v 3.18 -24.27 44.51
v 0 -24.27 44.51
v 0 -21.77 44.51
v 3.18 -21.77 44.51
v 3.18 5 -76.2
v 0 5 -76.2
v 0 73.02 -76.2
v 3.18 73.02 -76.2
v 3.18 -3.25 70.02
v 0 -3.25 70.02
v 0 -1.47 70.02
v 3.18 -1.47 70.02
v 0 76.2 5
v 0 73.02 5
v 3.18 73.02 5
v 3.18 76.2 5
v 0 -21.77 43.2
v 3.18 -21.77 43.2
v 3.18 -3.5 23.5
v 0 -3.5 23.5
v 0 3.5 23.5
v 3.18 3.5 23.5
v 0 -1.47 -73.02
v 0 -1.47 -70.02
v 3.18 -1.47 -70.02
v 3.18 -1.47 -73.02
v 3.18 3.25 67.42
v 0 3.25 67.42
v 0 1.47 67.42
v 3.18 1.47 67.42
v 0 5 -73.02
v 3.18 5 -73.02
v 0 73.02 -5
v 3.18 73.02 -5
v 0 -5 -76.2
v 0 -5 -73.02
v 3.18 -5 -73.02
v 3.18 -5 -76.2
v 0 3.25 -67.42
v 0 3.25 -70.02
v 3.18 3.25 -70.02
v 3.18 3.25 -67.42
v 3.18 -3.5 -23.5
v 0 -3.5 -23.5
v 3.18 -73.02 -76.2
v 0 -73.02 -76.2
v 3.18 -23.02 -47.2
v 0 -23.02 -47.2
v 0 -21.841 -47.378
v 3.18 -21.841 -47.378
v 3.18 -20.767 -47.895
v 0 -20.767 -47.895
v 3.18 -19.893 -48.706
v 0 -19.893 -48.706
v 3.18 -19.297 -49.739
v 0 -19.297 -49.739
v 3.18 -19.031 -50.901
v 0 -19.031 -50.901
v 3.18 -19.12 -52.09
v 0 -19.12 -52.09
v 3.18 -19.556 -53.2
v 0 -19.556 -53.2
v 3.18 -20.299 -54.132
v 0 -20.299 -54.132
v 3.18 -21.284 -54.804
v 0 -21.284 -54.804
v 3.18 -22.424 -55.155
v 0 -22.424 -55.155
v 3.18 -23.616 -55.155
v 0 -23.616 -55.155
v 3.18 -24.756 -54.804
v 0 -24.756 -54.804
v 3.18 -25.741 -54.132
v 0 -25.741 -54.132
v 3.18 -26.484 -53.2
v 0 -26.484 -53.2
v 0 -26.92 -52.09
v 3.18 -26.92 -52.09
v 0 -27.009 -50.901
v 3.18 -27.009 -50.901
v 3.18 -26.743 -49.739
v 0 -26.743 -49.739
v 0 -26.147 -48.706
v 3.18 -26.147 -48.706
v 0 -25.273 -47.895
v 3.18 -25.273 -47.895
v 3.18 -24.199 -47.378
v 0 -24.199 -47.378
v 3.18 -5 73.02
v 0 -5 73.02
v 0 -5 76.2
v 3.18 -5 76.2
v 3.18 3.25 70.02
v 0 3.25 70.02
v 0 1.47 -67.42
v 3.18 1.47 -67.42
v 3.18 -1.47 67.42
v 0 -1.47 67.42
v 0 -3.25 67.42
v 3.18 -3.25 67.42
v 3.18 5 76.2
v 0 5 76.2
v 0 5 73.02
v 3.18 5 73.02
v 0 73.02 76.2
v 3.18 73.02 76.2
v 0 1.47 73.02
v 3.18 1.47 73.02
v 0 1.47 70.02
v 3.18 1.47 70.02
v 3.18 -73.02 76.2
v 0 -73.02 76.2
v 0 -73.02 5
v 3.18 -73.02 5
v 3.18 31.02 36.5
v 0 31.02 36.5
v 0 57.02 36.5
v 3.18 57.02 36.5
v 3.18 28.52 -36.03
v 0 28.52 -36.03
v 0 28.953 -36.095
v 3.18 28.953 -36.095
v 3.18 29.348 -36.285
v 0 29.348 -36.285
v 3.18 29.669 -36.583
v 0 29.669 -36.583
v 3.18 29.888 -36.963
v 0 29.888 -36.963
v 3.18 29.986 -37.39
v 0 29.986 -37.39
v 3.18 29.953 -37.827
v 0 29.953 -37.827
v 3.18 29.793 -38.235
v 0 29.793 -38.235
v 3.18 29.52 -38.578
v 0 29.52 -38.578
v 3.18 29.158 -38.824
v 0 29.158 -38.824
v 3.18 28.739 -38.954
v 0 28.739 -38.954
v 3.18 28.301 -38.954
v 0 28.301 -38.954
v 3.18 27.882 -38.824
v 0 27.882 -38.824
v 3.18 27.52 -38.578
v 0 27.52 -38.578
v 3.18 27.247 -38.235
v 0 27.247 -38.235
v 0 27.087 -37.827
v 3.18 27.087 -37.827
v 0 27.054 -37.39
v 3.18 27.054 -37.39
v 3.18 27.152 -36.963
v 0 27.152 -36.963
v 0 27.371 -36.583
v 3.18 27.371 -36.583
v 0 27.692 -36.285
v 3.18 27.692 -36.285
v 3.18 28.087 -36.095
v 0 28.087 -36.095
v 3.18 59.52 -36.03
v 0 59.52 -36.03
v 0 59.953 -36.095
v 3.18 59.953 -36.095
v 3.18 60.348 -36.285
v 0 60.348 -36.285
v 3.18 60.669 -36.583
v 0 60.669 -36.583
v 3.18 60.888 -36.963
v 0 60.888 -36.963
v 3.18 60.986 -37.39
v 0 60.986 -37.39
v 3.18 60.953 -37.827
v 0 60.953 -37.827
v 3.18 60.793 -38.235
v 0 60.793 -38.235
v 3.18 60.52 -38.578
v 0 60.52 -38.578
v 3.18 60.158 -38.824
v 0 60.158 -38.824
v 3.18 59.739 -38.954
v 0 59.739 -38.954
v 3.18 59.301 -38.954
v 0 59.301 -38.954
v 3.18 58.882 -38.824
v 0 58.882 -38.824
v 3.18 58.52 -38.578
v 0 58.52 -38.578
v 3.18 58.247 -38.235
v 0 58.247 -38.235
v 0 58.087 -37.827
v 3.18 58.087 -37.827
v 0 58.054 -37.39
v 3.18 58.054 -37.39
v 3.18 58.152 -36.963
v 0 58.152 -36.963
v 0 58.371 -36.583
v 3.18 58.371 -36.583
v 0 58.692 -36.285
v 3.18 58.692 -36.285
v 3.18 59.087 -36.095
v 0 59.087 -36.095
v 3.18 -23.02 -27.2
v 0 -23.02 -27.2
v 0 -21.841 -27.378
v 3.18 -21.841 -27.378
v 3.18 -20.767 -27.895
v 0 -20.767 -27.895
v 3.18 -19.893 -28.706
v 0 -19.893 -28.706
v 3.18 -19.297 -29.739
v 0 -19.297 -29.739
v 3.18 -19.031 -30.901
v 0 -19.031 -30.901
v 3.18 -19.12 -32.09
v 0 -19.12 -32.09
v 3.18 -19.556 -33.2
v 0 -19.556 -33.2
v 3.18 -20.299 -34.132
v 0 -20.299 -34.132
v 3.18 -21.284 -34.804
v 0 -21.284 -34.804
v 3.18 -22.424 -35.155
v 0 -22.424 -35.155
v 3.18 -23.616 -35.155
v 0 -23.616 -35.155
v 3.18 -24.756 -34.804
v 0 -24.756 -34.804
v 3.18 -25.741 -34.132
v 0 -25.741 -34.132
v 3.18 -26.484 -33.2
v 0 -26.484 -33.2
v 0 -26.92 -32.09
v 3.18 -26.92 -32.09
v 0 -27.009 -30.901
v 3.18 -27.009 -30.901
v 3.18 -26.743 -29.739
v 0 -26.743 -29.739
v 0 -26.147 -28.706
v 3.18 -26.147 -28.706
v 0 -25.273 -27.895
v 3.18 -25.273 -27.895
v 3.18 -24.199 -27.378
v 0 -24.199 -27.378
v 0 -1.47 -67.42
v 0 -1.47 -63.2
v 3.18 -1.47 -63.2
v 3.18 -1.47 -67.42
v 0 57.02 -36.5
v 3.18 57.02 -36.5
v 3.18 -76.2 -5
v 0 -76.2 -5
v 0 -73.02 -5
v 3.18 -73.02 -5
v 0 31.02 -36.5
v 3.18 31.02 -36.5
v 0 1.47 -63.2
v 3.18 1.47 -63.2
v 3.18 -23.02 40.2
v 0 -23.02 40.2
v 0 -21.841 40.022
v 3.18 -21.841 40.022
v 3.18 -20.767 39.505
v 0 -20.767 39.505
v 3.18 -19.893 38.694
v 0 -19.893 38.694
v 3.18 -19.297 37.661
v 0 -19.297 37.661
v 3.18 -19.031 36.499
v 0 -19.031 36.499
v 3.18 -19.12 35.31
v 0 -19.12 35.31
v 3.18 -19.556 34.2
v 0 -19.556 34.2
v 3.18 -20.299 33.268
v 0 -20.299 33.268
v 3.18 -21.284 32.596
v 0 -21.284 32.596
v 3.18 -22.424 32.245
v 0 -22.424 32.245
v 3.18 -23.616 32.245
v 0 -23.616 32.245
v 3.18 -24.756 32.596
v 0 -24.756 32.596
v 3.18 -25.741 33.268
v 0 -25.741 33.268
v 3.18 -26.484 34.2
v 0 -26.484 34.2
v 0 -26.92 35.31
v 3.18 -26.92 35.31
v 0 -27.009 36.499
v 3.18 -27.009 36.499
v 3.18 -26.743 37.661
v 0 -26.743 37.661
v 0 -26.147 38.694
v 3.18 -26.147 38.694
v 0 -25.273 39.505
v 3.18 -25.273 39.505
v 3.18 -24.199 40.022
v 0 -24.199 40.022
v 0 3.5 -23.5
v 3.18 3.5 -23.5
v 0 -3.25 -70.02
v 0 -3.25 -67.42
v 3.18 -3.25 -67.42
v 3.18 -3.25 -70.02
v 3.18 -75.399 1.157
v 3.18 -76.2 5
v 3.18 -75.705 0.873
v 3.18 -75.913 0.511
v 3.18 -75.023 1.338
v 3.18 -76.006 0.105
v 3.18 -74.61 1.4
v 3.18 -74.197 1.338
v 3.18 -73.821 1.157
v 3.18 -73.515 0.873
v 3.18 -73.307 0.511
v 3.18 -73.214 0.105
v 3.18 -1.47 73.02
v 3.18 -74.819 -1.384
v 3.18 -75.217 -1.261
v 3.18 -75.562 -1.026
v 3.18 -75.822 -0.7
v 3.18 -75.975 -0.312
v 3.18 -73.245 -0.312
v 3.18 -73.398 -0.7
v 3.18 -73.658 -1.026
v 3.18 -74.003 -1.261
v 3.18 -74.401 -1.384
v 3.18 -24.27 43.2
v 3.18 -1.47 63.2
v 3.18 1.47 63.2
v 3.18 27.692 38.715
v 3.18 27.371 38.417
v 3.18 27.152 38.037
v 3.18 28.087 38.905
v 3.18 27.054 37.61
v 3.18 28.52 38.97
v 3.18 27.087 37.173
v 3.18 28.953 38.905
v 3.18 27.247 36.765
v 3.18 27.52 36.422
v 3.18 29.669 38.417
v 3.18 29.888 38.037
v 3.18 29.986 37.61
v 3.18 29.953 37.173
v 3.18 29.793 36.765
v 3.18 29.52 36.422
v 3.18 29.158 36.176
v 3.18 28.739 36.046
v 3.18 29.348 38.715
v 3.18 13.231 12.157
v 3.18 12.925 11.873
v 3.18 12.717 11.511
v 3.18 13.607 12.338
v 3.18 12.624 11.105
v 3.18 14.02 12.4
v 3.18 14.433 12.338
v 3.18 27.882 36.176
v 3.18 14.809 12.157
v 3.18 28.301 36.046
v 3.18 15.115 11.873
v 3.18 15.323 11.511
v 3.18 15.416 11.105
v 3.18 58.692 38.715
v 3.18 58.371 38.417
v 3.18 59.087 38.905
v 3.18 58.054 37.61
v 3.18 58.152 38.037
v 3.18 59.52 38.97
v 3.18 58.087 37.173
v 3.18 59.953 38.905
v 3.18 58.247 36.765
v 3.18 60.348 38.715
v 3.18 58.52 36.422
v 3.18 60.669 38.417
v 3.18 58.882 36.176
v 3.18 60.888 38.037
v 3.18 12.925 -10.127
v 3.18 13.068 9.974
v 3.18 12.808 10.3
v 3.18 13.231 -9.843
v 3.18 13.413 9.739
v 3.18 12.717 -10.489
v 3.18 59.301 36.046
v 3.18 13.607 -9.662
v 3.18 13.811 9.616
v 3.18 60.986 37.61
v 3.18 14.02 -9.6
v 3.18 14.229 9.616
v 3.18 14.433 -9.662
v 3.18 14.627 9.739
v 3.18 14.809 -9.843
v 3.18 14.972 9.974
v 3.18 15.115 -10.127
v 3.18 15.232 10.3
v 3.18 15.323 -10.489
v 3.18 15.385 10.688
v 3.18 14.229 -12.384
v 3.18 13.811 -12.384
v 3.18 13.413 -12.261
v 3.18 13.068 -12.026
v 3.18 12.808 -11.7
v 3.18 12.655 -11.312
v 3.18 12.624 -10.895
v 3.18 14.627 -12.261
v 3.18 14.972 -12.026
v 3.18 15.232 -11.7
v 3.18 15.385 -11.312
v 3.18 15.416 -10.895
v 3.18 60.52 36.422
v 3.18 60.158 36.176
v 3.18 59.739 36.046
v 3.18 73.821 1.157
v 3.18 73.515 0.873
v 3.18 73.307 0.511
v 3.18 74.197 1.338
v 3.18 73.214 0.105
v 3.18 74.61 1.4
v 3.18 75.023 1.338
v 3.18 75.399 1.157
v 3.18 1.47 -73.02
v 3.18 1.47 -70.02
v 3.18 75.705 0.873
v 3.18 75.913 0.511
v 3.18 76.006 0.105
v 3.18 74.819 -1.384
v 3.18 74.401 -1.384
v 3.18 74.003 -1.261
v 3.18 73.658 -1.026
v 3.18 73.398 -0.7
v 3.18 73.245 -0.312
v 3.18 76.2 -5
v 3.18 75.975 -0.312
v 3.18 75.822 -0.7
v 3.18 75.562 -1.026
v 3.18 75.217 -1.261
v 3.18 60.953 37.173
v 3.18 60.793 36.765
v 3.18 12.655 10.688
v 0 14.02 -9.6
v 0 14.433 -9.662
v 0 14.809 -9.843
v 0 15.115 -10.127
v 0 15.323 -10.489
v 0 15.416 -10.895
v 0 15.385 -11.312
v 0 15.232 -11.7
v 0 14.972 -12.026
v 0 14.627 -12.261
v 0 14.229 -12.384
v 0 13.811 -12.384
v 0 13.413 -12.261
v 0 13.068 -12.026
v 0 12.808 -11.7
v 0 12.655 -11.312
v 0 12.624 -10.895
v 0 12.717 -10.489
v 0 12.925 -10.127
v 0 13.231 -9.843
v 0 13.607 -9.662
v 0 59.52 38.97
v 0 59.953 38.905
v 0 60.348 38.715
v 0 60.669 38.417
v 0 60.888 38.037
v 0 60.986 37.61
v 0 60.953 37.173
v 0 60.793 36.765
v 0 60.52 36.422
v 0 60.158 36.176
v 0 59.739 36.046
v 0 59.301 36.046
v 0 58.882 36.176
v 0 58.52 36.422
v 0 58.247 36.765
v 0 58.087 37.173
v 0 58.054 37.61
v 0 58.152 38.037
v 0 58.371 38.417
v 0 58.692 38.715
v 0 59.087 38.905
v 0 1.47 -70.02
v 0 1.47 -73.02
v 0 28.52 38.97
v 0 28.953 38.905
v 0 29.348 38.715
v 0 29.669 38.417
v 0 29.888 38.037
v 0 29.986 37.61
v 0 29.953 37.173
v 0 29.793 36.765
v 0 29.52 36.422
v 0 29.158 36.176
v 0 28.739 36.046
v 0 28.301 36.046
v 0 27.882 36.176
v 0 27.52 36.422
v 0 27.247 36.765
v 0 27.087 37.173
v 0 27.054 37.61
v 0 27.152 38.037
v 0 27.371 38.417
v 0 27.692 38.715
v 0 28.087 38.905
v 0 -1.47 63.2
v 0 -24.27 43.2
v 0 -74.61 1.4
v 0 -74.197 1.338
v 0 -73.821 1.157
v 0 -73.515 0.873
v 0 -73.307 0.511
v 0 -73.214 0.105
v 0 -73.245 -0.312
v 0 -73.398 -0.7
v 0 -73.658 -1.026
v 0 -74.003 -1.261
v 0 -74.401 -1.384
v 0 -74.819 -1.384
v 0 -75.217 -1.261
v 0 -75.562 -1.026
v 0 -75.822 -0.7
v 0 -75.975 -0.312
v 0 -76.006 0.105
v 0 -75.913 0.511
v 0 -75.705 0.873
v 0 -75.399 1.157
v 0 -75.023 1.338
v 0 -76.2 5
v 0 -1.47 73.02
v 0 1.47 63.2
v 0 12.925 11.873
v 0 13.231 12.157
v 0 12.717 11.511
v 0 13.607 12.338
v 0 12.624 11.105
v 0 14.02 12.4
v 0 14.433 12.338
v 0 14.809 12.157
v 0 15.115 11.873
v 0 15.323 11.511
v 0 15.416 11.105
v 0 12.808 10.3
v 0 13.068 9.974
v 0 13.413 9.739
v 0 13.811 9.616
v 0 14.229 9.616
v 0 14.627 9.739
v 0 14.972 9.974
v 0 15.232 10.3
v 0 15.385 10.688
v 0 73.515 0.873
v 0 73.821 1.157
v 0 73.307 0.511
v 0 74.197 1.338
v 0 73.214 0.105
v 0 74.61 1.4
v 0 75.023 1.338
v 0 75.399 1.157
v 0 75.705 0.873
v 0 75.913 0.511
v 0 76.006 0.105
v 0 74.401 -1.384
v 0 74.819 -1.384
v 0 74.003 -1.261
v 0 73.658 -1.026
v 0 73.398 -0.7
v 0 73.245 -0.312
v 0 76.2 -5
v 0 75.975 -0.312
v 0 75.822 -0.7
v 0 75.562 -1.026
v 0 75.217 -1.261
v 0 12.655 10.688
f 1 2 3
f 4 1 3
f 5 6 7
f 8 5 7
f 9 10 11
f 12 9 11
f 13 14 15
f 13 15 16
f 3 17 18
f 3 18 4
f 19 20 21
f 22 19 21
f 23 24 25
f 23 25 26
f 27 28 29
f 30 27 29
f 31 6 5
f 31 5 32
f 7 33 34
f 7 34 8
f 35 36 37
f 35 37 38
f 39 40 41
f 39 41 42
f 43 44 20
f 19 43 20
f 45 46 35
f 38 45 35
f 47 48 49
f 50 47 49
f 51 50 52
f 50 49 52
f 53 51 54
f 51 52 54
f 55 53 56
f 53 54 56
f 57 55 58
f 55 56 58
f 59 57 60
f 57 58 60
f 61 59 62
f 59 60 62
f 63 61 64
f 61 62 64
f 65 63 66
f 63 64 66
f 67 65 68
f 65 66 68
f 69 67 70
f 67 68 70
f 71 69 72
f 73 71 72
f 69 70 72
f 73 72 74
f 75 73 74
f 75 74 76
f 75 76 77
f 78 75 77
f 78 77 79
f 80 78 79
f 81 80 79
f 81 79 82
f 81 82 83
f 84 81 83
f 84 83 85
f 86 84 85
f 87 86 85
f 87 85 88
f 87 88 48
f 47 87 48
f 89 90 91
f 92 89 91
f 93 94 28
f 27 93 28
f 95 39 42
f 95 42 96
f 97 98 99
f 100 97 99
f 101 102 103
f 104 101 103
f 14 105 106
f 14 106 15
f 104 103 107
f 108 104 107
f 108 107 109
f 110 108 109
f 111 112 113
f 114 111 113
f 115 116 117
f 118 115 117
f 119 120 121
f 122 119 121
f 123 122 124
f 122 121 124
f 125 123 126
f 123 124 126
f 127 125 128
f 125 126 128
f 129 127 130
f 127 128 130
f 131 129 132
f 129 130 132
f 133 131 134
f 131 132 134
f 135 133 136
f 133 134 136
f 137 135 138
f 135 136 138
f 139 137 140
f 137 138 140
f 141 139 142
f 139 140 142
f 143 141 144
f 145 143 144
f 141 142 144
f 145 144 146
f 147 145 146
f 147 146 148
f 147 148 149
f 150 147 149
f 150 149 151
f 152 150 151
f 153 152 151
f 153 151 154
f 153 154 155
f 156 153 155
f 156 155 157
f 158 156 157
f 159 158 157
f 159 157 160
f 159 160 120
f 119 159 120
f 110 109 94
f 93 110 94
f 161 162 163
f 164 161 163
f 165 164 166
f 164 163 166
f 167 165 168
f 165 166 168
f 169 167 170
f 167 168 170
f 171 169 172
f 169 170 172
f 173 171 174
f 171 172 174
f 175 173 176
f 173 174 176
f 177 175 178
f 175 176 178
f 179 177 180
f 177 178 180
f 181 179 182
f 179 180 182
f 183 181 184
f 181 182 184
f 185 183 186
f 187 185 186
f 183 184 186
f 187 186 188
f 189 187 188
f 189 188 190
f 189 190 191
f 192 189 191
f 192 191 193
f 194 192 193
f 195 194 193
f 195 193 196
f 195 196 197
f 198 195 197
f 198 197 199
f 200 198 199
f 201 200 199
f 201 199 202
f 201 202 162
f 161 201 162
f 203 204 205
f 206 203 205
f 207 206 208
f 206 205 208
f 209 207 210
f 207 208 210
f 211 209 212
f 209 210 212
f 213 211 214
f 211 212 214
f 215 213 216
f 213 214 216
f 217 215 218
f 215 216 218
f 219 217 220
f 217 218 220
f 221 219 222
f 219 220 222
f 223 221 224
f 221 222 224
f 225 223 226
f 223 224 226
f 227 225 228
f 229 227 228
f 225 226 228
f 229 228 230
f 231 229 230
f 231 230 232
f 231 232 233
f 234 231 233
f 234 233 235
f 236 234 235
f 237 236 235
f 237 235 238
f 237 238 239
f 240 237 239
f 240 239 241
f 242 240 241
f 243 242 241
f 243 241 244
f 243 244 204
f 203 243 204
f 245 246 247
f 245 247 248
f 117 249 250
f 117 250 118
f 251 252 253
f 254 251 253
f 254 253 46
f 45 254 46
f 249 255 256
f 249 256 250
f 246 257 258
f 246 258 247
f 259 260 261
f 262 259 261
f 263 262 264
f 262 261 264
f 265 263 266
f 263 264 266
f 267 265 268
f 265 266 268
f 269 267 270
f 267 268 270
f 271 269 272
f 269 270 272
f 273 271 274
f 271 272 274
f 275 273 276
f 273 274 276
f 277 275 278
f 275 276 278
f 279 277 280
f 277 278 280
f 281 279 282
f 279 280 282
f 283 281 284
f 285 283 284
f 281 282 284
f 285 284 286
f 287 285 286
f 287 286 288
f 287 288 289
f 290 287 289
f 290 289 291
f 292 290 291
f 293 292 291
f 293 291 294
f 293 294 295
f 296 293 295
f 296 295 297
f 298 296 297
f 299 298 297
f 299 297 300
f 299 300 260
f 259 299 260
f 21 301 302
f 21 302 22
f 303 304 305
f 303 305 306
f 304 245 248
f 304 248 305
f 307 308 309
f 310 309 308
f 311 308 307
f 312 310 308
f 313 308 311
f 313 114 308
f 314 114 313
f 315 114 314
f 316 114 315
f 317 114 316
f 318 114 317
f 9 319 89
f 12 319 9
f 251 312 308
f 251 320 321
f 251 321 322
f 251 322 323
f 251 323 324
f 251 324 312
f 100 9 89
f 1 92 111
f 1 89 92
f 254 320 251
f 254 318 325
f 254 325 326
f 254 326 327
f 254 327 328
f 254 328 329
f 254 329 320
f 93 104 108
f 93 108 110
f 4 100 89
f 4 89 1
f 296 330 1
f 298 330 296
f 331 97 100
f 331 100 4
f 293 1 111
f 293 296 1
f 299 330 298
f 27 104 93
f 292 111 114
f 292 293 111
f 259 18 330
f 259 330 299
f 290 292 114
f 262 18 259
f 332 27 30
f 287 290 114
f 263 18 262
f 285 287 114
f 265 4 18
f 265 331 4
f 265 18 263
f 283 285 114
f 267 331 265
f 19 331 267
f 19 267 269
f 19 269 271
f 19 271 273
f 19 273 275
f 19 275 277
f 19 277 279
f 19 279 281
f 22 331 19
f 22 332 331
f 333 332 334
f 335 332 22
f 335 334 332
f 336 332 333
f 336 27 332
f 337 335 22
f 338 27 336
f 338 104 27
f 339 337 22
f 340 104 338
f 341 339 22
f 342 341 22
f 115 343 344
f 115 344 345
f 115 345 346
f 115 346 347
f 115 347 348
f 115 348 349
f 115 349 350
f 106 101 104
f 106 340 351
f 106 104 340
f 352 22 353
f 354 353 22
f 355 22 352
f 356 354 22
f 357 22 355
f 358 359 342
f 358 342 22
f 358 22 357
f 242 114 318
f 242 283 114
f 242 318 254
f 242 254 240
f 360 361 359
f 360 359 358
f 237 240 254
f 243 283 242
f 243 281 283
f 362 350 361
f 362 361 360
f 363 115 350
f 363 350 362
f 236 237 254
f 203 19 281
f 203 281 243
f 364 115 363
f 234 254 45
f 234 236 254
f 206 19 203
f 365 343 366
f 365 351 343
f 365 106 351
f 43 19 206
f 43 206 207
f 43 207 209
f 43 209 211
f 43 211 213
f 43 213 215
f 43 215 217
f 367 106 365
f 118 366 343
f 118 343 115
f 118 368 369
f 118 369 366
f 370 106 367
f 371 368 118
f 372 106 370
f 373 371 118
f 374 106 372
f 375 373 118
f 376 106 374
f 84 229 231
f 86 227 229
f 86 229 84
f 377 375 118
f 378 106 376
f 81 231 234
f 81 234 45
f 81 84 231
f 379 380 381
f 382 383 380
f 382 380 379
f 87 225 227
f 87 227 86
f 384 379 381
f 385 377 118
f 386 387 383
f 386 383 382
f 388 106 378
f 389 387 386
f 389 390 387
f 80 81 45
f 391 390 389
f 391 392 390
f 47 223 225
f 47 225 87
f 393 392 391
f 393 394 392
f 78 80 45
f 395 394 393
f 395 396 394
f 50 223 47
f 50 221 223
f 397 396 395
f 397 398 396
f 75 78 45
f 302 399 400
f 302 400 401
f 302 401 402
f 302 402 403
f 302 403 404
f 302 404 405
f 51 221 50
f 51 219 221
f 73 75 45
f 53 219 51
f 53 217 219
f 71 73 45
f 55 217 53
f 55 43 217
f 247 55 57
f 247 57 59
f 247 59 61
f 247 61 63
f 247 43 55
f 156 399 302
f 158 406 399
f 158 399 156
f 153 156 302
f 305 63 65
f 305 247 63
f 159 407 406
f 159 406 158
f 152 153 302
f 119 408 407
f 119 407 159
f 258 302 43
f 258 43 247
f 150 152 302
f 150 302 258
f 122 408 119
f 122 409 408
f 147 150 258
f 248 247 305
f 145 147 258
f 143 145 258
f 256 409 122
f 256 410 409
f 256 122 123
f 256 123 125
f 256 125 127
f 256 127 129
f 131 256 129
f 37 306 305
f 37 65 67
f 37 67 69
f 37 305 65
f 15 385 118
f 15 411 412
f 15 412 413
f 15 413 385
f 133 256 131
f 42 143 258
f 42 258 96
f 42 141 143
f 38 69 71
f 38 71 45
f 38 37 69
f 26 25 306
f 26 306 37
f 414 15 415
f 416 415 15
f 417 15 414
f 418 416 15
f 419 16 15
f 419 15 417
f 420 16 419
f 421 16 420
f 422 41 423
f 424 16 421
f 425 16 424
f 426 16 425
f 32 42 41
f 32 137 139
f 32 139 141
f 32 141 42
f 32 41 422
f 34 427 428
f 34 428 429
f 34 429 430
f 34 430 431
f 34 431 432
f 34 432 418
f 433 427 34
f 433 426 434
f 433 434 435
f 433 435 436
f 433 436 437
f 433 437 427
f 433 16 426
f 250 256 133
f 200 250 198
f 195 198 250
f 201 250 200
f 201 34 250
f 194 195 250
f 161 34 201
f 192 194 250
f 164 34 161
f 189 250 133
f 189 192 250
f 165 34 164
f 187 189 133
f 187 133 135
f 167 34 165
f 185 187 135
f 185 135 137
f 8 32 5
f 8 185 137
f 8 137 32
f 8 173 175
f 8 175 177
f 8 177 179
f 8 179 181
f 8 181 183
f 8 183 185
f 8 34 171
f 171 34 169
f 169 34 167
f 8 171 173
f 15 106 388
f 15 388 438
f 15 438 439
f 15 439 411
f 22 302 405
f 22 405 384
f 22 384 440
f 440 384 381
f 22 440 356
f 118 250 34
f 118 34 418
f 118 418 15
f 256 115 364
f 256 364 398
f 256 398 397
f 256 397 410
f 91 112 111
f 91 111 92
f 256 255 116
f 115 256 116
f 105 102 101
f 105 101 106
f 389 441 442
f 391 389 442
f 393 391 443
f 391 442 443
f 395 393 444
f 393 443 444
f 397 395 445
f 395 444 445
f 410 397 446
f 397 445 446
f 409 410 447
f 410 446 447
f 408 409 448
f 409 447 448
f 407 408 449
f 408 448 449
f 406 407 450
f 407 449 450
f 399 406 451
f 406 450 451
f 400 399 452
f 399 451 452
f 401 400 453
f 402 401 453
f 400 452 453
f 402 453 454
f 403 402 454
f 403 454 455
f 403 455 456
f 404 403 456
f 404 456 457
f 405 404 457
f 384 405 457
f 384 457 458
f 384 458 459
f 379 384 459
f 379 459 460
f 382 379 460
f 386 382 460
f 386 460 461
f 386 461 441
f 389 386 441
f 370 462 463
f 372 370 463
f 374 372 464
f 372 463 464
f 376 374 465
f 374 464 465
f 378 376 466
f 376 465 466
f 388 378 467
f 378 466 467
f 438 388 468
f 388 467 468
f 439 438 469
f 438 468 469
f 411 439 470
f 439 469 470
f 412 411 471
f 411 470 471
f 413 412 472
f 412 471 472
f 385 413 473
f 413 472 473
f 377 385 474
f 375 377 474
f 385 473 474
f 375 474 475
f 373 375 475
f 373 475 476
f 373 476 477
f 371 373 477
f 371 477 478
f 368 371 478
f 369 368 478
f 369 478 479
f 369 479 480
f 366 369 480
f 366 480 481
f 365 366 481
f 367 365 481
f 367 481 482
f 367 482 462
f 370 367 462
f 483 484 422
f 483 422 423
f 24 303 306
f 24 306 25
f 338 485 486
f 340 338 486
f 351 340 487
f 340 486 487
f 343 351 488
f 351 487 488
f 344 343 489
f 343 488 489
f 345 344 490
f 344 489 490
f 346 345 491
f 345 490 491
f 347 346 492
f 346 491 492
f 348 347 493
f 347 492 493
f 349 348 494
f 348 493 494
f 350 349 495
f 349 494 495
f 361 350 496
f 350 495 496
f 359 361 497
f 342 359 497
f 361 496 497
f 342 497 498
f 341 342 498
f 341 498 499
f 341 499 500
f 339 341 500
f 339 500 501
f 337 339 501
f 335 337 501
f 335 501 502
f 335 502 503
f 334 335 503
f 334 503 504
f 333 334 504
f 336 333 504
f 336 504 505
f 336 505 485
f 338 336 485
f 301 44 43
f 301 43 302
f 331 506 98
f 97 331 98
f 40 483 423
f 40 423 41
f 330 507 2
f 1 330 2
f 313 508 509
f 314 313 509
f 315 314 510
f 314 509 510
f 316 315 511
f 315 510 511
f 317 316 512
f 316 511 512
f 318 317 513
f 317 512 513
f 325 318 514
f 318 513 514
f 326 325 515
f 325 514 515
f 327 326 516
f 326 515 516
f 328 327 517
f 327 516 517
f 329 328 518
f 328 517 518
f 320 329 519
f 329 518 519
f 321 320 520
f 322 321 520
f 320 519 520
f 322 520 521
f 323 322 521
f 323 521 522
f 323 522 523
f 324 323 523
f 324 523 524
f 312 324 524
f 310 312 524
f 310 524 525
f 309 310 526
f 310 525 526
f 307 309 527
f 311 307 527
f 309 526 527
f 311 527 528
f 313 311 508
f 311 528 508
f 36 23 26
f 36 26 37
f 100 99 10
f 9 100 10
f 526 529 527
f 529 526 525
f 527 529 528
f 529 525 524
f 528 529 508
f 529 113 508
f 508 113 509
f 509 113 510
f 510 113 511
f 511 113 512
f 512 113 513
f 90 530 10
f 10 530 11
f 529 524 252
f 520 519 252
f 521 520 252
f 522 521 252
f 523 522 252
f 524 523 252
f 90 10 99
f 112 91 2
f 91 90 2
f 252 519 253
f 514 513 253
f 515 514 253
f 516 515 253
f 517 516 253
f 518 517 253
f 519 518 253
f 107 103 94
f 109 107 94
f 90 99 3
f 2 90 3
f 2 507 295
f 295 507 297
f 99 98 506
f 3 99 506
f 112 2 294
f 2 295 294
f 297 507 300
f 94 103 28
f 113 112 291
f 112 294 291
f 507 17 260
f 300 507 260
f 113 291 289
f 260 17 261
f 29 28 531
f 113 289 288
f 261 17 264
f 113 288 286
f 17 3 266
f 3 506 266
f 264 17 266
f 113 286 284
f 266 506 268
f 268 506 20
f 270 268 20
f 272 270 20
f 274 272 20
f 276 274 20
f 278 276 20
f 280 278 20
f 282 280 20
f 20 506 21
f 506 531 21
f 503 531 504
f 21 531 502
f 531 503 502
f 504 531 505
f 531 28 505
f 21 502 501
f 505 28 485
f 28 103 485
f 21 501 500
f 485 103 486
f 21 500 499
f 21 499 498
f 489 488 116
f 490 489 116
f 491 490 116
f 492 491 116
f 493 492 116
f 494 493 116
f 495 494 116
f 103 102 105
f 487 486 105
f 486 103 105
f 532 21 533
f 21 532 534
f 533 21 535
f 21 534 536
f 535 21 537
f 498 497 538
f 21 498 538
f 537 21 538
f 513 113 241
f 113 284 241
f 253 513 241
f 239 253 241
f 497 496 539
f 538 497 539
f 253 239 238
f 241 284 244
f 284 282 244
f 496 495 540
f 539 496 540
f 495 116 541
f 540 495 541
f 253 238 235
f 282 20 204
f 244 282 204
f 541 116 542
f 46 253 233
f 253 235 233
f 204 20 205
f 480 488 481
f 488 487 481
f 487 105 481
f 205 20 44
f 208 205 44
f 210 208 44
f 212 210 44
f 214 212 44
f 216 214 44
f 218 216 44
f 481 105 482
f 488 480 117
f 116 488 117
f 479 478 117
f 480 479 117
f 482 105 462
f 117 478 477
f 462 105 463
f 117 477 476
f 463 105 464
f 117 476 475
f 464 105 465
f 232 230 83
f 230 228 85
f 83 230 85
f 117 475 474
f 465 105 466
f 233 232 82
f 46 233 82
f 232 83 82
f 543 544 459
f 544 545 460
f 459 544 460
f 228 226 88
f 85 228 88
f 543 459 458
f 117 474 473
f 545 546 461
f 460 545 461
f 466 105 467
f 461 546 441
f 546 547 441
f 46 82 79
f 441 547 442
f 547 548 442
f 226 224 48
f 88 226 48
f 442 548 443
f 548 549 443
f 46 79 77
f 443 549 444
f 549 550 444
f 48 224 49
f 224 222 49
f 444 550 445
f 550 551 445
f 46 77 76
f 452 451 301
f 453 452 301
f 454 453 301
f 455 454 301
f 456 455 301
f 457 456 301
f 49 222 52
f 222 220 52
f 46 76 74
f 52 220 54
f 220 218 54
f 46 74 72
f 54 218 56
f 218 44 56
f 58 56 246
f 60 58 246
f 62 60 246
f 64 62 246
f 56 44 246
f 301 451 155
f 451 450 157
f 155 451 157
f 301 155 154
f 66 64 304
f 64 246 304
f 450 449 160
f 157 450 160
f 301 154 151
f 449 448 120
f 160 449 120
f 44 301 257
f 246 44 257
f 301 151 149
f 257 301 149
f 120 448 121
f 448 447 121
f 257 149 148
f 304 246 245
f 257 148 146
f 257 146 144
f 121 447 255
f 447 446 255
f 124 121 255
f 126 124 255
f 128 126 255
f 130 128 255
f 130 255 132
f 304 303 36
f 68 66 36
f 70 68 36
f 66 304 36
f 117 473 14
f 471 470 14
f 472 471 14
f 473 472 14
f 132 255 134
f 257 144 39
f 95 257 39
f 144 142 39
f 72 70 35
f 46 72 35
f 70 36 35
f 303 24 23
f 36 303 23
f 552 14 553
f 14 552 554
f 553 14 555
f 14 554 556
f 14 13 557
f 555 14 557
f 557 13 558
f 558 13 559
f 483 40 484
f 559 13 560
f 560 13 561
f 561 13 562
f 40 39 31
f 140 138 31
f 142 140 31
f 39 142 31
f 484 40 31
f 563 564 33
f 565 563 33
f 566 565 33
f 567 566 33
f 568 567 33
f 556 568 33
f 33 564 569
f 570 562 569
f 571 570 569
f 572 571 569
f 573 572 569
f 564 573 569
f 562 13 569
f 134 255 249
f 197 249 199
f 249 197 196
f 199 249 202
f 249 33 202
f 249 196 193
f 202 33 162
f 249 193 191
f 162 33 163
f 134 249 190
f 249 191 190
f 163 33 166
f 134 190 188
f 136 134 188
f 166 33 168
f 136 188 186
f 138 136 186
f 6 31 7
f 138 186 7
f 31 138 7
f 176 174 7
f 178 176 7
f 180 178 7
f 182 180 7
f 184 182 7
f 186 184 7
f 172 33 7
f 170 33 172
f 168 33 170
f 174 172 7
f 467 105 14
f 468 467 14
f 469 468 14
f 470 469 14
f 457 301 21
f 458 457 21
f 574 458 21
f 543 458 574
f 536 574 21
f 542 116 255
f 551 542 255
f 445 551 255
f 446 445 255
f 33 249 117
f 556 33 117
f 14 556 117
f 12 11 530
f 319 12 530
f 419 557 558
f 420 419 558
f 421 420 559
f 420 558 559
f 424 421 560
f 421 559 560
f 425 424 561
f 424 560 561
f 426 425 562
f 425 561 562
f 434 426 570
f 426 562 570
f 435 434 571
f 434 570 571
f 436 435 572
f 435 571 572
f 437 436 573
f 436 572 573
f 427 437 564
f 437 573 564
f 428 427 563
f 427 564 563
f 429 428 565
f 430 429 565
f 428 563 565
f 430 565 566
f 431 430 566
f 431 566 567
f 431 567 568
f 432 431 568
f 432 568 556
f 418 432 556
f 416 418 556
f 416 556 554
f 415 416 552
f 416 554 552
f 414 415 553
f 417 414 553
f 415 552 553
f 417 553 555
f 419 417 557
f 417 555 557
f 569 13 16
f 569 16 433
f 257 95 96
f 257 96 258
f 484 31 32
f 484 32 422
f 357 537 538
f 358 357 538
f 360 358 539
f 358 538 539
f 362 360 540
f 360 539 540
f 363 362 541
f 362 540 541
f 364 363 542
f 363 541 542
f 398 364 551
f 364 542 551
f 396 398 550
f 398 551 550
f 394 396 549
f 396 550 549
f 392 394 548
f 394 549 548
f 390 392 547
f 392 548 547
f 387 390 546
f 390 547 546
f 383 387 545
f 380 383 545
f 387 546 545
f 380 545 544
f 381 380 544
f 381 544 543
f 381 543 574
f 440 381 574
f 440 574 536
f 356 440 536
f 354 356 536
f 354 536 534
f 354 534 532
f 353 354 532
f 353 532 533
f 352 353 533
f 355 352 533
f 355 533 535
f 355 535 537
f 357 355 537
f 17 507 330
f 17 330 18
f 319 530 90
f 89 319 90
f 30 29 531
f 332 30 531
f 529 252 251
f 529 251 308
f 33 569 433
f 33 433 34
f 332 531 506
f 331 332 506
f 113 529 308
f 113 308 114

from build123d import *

# Parameters (mm, degrees)
SKETCH1_W               = 152.4
SKETCH1_H               = 146.04
BOSS_EXTRUDE1_DEPTH     = 3.18
SKETCH3_R               = 1.4
SKETCH3_W               = 10
SKETCH3_H               = 3.18
BOSS_EXTRUDE5_DEPTH     = 3.18
CUT_EXTRUDE2_DEPTH      = 4.18
CUT_EXTRUDE3_DEPTH      = 4.18
SKETCH6_W               = 73
SKETCH6_H               = 26
CUT_EXTRUDE4_DEPTH      = 10
SKETCH7_R               = 1.47
CUT_EXTRUDE5_DEPTH      = 4.18
SKETCH8_R               = 4
CUT_EXTRUDE6_DEPTH      = 4.18
SKETCH9_W               = 47
SKETCH9_H               = 7
CUT_EXTRUDE7_DEPTH      = 1
CUT_EXTRUDE7_DEPTH_BACK = 4.18
SKETCH10_W              = 1.31
SKETCH10_H              = 2.5
CUT_EXTRUDE8_DEPTH      = 4.18
SKETCH11_R              = 1.4
CUT_EXTRUDE9_DEPTH      = 4.18


with BuildPart() as part:
    # Sketch1 → Boss-Extrude1 (new body)
    with BuildSketch(Plane(origin=(0, 0, 0), x_dir=(0, 0, -1), z_dir=(1, 0, 0))):
        Rectangle(SKETCH1_W, SKETCH1_H)
    extrude(amount=BOSS_EXTRUDE1_DEPTH)

    # Sketch3 → Boss-Extrude5 (add)
    with BuildSketch(Plane.ZY):
        Polygon((0, 73.02), (5, 73.02), (5, 76.2), (-5, 76.2), (-5, 73.02), align=None)
        with Locations((0, 74.61)):
            Circle(SKETCH3_R, mode=Mode.SUBTRACT)
        with Locations((0, -74.61)):
            Rectangle(SKETCH3_W, SKETCH3_H)
        with Locations((0, -74.61)):
            Circle(SKETCH3_R, mode=Mode.SUBTRACT)
    extrude(amount=-BOSS_EXTRUDE5_DEPTH)

    # Sketch4 → Cut-Extrude2 (cut, through all)
    with BuildSketch(Plane(origin=(0, 0, 0), x_dir=(0, 0, -1), z_dir=(1, 0, 0))):
        Polygon((-76.2, -5), (-76.2, 5), (-73.02, 5), (-73.02, 1.47), (-70.02, 1.47), (-70.02, 3.25), (-67.42, 3.25), (-67.42, 1.47), (-63.2, 1.47), (-63.2, -1.47), (-67.42, -1.47), (-67.42, -3.25), (-70.02, -3.25), (-70.02, -1.47), (-73.02, -1.47), (-73.02, -5), align=None)
    extrude(amount=CUT_EXTRUDE2_DEPTH, mode=Mode.SUBTRACT)

    # Sketch5 → Cut-Extrude3 (cut, through all)
    with BuildSketch(Plane.ZY):
        Polygon((-70.02, -1.47), (-73.02, -1.47), (-73.02, -5), (-76.2, -5), (-76.2, 5), (-73.02, 5), (-73.02, 1.47), (-70.02, 1.47), (-70.02, 3.25), (-67.42, 3.25), (-67.42, 1.47), (-63.2, 1.47), (-63.2, -1.47), (-67.42, -1.47), (-67.42, -3.25), (-70.02, -3.25), align=None)
    extrude(amount=-CUT_EXTRUDE3_DEPTH, mode=Mode.SUBTRACT)

    # Sketch6 → Cut-Extrude4 (cut)
    with BuildSketch(Plane.ZY):
        with Locations((0, 44.02)):
            Rectangle(SKETCH6_W, SKETCH6_H)
    extrude(amount=-CUT_EXTRUDE4_DEPTH, mode=Mode.SUBTRACT)

    # Sketch7 → Cut-Extrude5 (cut, through all)
    with BuildSketch(Plane.ZY):
        with Locations((-37.5, 59.52)):
            Circle(SKETCH7_R)
        with Locations((-37.5, 28.52)):
            Circle(SKETCH7_R)
        with Locations((37.5, 59.52)):
            Circle(SKETCH7_R)
        with Locations((37.5, 28.52)):
            Circle(SKETCH7_R)
    extrude(amount=-CUT_EXTRUDE5_DEPTH, mode=Mode.SUBTRACT)

    # Sketch8 → Cut-Extrude6 (cut, through all)
    with BuildSketch(Plane.ZY):
        with Locations((-51.2, -23.02)):
            Circle(SKETCH8_R)
        with Locations((-31.2, -23.02)):
            Circle(SKETCH8_R)
        with Locations((36.2, -23.02)):
            Circle(SKETCH8_R)
    extrude(amount=-CUT_EXTRUDE6_DEPTH, mode=Mode.SUBTRACT)

    # Sketch9 → Cut-Extrude7 (cut, two sides)
    with BuildSketch(Plane.ZY) as cut_extrude7_sk:
        Rectangle(SKETCH9_W, SKETCH9_H)
    extrude(amount=CUT_EXTRUDE7_DEPTH, mode=Mode.SUBTRACT)
    extrude(cut_extrude7_sk.sketch, amount=-CUT_EXTRUDE7_DEPTH_BACK, mode=Mode.SUBTRACT)

    # Sketch10 → Cut-Extrude8 (cut, through all)
    with BuildSketch(Plane.ZY):
        with Locations((43.855, -23.02)):
            Rectangle(SKETCH10_W, SKETCH10_H)
    extrude(amount=-CUT_EXTRUDE8_DEPTH, mode=Mode.SUBTRACT)

    # Sketch11 → Cut-Extrude9 (cut, through all)
    with BuildSketch(Plane.ZY):
        with Locations((-11, 14.02)):
            Circle(SKETCH11_R)
        with Locations((11, 14.02)):
            Circle(SKETCH11_R)
    extrude(amount=-CUT_EXTRUDE9_DEPTH, mode=Mode.SUBTRACT)


solid = part.part
